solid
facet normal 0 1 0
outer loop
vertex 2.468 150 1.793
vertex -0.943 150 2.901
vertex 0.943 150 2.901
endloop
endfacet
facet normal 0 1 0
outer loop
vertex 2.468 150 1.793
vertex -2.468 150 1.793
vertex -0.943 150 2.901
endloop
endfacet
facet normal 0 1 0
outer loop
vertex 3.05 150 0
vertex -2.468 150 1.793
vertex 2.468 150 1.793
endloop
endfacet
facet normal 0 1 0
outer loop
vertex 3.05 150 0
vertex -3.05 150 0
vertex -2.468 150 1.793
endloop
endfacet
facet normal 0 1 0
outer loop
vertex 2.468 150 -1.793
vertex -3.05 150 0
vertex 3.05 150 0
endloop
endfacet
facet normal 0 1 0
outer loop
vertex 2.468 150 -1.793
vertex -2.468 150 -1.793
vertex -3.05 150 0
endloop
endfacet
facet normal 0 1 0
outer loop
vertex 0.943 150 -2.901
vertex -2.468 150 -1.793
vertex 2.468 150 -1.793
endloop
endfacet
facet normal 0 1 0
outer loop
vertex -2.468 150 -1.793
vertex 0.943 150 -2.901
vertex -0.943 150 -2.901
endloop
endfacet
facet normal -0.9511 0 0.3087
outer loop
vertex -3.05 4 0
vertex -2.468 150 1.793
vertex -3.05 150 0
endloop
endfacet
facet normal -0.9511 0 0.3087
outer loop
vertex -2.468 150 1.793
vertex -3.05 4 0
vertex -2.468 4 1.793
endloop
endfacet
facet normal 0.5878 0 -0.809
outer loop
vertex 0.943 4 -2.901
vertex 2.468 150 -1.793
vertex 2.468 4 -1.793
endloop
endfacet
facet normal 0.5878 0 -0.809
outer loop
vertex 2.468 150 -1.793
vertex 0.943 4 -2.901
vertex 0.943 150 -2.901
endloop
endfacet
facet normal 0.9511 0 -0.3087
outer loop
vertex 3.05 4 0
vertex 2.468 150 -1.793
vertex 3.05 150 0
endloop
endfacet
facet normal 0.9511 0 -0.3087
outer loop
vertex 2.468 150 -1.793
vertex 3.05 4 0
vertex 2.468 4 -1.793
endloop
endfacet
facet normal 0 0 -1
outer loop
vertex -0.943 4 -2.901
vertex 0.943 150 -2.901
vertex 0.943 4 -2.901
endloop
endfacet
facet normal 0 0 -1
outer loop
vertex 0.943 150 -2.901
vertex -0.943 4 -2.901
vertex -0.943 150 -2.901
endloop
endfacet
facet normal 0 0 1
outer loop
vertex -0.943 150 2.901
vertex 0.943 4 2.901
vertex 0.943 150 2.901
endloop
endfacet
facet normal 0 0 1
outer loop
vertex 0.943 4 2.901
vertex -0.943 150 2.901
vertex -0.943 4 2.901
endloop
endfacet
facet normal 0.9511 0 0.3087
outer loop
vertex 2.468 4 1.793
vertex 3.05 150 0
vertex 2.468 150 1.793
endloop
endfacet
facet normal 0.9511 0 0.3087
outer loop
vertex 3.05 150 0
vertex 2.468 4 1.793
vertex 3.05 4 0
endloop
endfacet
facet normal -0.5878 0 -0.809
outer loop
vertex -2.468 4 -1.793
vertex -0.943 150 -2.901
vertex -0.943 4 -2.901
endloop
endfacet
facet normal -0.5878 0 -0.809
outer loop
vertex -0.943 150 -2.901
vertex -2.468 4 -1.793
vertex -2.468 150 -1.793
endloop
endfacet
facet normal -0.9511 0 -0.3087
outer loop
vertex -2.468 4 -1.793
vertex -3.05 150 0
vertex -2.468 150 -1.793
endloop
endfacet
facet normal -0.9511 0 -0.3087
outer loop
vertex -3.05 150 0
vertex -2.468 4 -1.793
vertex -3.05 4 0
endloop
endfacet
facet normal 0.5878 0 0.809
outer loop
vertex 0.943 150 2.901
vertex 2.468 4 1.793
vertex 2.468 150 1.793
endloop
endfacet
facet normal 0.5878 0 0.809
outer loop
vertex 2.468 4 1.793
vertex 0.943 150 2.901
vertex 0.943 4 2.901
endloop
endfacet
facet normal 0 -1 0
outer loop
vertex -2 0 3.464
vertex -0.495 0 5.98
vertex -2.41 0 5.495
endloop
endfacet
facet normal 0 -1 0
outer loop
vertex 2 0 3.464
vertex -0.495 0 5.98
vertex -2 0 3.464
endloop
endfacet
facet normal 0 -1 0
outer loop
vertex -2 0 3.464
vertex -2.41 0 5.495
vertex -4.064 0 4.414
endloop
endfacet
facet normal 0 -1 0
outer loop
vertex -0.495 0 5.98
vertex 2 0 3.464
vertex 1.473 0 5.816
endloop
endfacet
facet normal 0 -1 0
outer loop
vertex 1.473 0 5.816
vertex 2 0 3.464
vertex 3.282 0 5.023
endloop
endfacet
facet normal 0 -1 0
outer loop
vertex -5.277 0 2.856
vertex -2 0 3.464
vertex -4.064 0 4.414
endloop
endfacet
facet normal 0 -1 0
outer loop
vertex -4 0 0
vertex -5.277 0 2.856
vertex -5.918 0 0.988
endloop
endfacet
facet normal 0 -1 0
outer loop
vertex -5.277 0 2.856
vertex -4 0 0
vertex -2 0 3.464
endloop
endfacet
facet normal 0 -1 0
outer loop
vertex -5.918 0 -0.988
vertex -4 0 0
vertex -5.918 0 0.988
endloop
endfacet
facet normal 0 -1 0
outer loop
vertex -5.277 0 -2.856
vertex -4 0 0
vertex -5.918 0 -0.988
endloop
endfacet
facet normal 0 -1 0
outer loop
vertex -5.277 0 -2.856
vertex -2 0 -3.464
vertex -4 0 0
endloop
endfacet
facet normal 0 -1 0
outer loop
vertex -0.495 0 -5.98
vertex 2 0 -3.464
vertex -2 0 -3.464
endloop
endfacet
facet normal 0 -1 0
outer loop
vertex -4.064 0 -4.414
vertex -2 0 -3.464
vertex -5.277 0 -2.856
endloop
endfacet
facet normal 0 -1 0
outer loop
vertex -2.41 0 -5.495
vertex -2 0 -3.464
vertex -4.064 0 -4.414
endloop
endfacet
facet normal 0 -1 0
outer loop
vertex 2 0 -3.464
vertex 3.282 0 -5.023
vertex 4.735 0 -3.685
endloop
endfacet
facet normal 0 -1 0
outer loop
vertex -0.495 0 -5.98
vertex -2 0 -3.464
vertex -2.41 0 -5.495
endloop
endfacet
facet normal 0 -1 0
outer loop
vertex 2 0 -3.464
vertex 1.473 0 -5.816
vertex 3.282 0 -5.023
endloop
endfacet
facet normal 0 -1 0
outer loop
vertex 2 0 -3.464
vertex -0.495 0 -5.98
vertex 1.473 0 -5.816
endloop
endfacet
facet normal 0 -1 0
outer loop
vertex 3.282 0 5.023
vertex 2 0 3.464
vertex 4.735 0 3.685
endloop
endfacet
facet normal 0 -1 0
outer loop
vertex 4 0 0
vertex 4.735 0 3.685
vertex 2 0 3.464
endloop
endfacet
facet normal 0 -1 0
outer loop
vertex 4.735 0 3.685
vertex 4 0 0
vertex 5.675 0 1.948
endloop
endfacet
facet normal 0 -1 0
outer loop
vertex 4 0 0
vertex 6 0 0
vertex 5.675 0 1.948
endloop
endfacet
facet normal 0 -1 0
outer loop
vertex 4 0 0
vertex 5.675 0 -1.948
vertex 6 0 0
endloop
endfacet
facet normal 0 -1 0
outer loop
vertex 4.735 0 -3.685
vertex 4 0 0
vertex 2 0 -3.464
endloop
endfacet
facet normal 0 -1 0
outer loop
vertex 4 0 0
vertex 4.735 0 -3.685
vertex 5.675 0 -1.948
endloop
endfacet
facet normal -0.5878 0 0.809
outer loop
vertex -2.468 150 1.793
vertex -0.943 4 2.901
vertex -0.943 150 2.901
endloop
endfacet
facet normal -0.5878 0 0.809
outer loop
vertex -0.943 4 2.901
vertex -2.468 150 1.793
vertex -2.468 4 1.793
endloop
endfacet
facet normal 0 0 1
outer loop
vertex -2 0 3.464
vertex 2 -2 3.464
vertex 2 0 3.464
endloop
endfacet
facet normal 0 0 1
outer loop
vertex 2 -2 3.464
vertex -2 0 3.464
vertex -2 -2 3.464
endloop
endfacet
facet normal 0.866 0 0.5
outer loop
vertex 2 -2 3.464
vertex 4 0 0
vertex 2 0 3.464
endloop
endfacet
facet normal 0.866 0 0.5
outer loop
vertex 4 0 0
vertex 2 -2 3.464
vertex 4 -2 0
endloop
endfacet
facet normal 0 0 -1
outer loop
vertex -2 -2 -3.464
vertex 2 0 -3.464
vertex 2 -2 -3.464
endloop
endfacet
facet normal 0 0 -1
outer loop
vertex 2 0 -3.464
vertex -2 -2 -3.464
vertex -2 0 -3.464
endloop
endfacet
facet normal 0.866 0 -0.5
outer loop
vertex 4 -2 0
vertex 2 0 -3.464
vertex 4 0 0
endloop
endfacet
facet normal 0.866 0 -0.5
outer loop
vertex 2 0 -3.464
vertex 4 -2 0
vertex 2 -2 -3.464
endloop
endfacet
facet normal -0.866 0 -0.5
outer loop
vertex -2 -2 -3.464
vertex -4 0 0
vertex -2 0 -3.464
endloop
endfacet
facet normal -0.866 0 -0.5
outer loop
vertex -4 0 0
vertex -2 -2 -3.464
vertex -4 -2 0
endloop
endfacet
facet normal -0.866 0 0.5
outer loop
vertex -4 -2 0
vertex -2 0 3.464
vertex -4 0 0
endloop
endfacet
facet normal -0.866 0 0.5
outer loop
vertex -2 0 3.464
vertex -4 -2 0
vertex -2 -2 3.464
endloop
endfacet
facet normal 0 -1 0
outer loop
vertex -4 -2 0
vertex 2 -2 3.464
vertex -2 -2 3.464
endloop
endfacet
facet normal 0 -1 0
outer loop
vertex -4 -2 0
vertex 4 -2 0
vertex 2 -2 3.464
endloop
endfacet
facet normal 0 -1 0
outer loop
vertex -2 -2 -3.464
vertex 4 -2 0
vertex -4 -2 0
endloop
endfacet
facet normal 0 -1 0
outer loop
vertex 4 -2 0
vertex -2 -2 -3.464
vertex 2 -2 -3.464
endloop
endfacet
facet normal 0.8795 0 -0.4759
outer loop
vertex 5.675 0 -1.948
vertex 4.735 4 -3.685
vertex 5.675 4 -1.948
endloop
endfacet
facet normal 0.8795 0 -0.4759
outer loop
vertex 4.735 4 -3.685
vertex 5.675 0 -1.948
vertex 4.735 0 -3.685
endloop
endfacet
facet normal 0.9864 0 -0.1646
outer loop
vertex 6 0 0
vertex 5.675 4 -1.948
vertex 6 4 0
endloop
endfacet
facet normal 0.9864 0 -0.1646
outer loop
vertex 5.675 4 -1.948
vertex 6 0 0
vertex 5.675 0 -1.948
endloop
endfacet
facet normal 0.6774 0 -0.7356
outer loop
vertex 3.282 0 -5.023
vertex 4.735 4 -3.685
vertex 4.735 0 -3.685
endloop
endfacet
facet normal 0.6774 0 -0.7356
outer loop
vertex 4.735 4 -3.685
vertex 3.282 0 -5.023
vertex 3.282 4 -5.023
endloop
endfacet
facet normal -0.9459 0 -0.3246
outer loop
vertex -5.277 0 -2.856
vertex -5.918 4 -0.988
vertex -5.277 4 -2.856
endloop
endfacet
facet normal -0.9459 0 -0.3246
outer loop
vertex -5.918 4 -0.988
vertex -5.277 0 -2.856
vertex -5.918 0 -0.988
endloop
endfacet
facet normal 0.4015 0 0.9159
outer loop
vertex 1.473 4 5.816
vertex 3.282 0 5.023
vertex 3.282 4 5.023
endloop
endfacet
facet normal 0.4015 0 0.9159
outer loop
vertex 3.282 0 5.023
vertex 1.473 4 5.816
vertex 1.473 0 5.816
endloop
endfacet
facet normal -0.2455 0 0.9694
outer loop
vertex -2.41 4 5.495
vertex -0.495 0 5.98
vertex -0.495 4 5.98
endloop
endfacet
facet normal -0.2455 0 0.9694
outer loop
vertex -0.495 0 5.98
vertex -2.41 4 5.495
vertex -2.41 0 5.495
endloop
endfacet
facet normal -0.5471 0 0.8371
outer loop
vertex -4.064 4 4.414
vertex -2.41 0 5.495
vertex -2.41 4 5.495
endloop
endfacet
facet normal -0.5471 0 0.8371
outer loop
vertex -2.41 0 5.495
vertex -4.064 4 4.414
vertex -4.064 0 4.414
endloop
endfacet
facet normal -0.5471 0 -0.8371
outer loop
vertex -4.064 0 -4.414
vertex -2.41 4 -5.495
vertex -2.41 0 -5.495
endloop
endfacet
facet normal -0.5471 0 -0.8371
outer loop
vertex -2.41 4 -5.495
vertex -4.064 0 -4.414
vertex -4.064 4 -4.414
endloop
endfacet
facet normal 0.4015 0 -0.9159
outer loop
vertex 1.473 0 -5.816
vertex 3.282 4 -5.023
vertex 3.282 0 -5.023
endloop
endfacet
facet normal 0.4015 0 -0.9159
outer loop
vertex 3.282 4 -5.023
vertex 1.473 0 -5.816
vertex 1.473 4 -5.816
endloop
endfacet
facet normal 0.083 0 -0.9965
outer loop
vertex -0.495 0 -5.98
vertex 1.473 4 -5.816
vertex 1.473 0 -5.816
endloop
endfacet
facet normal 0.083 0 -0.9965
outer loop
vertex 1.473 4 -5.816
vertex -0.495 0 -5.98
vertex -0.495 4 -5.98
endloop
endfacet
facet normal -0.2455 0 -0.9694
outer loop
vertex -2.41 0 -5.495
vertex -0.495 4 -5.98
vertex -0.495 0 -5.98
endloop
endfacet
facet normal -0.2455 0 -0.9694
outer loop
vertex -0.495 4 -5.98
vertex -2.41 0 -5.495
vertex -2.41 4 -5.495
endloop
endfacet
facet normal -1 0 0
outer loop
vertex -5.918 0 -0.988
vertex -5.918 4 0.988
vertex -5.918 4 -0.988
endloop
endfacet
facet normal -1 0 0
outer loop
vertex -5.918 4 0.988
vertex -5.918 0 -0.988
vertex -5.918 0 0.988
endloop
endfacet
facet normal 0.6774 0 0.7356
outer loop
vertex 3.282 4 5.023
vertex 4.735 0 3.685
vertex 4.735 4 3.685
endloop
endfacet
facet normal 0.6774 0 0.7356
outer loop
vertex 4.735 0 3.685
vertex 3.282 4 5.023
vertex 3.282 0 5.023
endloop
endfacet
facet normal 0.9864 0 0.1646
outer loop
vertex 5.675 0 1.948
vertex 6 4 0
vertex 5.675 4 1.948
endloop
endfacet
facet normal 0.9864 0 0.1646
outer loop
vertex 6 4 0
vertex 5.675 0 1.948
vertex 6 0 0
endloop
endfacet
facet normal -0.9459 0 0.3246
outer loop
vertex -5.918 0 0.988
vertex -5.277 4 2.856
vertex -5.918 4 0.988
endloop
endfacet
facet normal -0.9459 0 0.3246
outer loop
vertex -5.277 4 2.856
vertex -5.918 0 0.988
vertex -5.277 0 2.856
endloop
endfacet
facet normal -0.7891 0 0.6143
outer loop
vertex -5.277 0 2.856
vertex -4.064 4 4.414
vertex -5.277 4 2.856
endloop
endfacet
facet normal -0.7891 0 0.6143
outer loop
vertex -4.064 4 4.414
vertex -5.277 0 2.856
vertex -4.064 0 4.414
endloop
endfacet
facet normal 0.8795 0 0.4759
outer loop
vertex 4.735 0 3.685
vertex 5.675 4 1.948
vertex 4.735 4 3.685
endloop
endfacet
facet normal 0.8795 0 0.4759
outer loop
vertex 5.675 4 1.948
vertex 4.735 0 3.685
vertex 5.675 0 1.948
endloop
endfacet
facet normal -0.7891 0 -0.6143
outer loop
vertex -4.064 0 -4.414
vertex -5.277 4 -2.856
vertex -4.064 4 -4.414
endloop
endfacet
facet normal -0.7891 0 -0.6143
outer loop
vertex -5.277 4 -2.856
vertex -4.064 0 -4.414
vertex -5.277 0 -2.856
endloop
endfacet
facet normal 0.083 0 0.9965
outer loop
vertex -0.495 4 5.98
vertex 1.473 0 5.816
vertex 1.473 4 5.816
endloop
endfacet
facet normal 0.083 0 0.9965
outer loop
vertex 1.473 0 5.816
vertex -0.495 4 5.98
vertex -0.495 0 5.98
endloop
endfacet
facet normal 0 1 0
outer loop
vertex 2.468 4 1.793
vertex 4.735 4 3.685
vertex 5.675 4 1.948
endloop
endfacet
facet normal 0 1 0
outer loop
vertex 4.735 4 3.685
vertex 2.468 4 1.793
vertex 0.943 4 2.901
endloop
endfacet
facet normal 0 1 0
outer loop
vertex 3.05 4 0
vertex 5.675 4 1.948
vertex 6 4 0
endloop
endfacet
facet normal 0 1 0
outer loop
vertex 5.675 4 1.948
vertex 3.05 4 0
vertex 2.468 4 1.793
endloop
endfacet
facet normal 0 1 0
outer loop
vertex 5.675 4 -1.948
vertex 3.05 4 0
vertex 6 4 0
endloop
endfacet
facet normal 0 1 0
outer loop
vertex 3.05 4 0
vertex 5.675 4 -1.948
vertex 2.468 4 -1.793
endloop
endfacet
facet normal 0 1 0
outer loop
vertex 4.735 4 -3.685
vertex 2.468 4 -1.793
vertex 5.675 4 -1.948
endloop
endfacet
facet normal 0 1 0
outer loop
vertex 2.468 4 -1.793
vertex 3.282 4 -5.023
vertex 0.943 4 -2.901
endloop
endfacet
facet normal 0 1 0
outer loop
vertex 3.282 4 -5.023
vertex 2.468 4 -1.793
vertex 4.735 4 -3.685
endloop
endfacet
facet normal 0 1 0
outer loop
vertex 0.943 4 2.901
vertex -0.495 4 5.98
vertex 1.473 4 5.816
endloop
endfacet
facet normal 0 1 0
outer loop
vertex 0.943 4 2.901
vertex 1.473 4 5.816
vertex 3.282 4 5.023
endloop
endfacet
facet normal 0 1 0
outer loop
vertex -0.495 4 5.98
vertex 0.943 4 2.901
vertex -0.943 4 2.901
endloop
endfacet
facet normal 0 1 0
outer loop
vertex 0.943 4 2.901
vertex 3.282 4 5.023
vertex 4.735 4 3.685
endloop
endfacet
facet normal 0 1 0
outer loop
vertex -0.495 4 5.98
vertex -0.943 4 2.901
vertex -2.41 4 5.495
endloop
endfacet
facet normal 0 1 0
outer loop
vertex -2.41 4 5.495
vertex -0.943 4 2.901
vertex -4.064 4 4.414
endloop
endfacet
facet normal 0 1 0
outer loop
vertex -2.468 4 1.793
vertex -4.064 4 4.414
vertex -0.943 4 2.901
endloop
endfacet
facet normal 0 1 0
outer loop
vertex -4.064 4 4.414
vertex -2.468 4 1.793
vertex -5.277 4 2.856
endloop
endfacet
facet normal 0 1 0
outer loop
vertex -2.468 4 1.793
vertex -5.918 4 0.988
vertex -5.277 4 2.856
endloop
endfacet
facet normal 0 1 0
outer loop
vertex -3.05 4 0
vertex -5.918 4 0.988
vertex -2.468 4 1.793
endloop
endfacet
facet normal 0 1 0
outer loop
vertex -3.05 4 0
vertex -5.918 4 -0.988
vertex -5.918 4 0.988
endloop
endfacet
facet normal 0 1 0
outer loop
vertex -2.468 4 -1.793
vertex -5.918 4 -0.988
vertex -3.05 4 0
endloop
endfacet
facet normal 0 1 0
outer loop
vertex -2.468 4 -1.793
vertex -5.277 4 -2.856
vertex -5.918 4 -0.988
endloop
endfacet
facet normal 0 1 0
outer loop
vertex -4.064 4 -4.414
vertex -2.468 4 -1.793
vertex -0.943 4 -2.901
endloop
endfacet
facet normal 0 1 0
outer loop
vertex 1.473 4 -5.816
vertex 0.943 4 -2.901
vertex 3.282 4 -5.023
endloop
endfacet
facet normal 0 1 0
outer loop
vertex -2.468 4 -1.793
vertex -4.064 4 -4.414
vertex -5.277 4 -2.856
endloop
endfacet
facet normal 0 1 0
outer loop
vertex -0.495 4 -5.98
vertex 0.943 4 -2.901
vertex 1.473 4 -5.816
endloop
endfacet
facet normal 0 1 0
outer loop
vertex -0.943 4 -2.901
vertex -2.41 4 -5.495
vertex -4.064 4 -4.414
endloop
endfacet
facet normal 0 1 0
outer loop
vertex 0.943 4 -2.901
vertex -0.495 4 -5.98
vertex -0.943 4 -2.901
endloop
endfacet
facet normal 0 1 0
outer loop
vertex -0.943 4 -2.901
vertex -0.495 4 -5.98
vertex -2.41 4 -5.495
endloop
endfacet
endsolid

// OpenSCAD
/*
 * Random parts
 */


m6_150_bolt();

m6_bracket();

module m6_150_bolt() {
  color("silver") {
    rotate([-90,0,0]) {
      cylinder(h=150,r=3+.05);
      translate([0,0,-2])
      cylinder(h=2, r=4, $fn=6);
    }
  }
}

module m6_bracket() {
  rotate([-90,0,0])
  cylinder(h=4, r=6);
}
